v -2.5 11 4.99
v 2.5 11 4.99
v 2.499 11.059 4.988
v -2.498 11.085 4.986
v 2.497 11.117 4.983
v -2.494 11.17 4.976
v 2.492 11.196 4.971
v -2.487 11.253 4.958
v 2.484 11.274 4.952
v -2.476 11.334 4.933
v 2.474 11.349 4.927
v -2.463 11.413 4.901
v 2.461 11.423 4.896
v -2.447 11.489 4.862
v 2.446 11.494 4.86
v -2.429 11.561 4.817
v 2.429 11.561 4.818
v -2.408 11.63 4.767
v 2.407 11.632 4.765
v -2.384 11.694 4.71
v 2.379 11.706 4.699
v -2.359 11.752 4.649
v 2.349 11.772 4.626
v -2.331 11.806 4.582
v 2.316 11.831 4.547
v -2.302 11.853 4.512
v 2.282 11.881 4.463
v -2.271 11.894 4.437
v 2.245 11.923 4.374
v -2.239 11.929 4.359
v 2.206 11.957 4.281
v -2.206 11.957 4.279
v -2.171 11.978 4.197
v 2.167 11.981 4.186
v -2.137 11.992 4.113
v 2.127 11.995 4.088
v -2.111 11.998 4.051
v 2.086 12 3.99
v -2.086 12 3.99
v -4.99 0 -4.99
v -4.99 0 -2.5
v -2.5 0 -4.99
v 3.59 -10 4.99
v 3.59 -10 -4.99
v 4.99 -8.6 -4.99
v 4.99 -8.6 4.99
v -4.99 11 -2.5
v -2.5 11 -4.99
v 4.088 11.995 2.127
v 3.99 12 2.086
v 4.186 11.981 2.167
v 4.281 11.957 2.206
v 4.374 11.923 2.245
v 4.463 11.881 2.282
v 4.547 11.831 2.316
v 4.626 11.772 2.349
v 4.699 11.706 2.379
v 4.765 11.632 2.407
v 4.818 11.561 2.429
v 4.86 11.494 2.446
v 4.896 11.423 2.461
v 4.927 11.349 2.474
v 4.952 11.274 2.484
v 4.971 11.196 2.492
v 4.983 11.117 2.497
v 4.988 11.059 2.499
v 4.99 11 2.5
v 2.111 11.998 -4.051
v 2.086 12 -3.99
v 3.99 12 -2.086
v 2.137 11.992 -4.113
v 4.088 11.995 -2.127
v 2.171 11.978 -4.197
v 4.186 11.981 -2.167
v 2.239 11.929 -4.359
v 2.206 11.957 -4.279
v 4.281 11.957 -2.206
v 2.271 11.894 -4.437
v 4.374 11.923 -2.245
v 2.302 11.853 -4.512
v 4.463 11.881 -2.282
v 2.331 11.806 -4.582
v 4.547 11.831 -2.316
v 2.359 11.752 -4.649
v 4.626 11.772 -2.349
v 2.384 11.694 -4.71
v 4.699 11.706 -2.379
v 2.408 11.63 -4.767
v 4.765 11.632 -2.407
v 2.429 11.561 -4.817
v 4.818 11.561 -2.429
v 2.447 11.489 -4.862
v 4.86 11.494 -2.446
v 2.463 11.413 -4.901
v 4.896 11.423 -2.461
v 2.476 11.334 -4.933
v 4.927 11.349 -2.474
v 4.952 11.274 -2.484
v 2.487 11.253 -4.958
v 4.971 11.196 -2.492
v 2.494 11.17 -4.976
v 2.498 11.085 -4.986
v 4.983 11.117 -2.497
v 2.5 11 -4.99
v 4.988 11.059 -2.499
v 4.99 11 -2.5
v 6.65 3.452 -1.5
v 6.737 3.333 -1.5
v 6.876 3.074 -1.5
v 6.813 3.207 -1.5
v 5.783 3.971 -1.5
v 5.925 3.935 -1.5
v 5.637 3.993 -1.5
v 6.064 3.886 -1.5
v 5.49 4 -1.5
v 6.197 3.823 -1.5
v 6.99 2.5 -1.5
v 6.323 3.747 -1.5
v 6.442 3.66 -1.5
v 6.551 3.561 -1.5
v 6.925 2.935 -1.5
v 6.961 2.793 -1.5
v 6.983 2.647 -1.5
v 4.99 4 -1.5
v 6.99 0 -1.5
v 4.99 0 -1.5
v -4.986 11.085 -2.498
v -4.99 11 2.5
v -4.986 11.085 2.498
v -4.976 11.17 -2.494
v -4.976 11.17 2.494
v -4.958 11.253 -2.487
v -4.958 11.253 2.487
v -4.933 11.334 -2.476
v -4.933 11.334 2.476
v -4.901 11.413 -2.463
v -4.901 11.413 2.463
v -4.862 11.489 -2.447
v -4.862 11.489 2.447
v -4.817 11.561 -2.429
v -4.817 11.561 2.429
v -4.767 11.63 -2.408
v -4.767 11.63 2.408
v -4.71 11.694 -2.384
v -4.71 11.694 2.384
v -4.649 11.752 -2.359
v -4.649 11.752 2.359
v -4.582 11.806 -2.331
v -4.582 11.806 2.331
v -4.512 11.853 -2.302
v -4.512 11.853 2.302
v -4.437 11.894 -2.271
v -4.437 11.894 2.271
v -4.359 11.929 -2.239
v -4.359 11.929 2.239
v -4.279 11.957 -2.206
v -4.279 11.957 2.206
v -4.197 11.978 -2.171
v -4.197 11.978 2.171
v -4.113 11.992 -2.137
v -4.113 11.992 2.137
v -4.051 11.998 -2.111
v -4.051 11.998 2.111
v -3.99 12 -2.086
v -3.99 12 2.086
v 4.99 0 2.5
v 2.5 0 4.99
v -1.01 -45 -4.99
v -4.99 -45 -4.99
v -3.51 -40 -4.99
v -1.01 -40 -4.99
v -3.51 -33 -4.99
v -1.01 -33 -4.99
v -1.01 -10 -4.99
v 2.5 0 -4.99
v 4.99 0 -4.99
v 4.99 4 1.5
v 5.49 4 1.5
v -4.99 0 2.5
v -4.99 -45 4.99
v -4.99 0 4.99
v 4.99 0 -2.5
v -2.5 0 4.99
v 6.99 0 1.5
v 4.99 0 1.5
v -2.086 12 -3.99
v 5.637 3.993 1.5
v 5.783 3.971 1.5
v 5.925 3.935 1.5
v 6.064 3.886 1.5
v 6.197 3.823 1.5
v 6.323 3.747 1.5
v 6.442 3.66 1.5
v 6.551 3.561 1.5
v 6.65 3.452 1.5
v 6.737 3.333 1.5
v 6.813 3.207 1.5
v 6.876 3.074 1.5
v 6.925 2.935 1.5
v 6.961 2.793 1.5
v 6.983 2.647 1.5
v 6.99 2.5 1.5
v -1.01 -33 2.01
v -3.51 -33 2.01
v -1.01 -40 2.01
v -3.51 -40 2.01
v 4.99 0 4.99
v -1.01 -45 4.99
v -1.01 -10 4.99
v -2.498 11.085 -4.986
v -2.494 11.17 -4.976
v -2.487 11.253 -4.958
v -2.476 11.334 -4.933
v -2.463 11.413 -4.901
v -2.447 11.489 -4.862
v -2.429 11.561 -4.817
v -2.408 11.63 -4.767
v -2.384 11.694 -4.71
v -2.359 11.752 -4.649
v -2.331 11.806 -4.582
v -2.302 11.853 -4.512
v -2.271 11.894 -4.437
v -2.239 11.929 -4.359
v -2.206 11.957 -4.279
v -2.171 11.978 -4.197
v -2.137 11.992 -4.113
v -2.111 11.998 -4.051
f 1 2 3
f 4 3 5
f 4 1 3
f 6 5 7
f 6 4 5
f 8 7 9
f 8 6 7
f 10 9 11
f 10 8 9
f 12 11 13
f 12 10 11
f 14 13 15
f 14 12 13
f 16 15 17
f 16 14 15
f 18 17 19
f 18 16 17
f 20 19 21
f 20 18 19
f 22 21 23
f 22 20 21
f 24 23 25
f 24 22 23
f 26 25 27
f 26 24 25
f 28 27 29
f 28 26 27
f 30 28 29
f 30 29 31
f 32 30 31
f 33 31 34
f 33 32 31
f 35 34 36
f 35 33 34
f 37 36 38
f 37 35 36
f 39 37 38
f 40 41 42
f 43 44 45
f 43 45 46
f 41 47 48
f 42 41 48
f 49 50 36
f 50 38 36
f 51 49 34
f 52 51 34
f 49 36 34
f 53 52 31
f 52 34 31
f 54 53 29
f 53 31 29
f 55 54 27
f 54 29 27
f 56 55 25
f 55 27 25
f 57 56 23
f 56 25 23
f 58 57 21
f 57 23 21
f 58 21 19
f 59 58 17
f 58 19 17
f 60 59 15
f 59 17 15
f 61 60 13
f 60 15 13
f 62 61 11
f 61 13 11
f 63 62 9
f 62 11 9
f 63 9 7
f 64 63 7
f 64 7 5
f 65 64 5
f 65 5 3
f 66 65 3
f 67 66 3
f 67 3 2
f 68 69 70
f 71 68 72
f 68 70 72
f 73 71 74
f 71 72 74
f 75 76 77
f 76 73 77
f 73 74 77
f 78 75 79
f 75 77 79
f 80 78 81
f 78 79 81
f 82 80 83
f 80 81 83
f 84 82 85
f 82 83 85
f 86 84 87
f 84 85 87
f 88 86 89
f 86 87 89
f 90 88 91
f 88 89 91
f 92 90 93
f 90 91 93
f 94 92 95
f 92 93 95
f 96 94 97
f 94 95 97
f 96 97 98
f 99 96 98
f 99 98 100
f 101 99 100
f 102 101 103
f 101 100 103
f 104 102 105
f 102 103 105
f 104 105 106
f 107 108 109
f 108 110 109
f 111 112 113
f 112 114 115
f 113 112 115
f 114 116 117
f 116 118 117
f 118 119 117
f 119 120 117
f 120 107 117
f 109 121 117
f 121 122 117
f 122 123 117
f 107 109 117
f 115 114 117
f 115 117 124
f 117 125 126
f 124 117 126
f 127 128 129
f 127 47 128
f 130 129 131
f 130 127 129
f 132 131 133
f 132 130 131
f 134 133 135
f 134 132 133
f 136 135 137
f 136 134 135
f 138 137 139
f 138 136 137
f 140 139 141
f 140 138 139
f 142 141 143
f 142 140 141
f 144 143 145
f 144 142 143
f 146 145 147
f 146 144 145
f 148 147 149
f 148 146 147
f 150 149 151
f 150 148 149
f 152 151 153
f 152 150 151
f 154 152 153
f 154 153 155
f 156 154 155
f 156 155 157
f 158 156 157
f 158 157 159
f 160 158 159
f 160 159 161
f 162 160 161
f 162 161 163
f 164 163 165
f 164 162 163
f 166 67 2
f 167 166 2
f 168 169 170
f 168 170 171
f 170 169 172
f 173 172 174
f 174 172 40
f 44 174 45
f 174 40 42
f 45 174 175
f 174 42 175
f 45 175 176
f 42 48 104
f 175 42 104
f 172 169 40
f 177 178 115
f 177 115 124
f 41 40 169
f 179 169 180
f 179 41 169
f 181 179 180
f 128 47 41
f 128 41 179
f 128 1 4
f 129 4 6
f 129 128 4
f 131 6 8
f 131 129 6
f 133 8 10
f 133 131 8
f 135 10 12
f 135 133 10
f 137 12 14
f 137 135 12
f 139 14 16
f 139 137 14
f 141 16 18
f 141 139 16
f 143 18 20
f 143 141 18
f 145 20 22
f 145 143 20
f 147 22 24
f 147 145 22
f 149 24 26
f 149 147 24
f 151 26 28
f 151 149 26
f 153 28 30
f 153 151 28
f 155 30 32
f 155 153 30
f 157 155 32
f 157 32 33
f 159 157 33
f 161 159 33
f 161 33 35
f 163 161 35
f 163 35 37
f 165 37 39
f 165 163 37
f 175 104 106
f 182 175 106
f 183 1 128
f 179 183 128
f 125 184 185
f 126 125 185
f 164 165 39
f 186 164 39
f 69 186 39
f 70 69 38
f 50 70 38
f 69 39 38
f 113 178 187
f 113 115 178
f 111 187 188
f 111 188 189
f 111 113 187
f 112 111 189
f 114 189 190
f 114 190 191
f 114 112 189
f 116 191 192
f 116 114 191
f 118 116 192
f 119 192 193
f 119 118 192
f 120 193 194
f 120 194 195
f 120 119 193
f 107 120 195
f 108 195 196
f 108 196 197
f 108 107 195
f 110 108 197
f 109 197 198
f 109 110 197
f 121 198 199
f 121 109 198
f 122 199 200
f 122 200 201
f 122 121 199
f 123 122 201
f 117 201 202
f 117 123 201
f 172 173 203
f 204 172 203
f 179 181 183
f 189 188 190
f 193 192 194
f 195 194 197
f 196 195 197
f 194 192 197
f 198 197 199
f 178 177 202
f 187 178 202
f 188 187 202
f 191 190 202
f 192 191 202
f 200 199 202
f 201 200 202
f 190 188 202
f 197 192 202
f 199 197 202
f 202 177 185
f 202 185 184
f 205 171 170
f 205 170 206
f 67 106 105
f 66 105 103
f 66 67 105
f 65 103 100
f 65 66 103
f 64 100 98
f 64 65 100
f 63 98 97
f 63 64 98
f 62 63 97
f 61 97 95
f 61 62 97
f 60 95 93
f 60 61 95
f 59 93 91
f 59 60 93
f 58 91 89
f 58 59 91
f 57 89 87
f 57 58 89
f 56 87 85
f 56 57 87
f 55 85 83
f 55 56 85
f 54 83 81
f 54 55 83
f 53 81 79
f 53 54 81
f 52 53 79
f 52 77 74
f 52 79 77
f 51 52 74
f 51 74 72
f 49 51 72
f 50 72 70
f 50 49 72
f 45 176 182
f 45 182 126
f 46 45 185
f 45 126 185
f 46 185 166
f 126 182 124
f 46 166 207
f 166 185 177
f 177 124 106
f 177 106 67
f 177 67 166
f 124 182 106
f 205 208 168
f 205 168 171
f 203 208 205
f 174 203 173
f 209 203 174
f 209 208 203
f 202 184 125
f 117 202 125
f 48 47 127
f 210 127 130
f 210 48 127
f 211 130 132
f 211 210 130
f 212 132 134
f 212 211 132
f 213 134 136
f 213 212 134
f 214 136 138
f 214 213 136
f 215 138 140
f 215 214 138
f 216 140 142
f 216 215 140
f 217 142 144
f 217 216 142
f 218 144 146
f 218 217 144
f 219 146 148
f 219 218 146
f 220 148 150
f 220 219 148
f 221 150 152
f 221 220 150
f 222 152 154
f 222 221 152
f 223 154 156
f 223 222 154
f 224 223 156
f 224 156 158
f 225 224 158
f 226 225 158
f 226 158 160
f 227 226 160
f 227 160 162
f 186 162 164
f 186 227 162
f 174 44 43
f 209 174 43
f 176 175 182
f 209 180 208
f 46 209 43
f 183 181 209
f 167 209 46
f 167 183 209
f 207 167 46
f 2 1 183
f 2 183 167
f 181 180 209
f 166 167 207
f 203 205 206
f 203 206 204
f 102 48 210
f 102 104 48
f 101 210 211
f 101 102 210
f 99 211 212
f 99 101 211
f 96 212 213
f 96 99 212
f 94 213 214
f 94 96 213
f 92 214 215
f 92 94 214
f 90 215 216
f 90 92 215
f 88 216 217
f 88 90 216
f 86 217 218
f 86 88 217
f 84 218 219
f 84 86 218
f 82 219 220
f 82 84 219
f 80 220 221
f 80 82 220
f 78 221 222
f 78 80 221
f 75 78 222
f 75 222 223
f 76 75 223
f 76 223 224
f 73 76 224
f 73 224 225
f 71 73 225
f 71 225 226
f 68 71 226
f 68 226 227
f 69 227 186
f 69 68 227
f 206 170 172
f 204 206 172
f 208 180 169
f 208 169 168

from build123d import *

# Parameters (mm, degrees)
SKETCH_W        = 9.98
SKETCH_H        = 9.98
PAD_DEPTH       = 45
SKETCH001_W     = 7
SKETCH001_H     = 7
POCKET_DEPTH    = 8.5
PAD001_DEPTH    = 12
FILLET_R        = 1
SKETCH004_W     = 35
SKETCH004_H     = 9.98
POCKET002_DEPTH = 6
CHAMFER_SIZE    = 1.4
PAD002_DEPTH    = 4
FILLET001_R     = 1.5


with BuildPart() as part:
    # Sketch → Pad (new body)
    with BuildSketch(Plane.XZ):
        Rectangle(SKETCH_W, SKETCH_H)
    extrude(amount=PAD_DEPTH)

    # Sketch001 (on Face3 of Pad) → Pocket (cut)
    with BuildSketch(Plane.YZ.offset(4.99)):
        with Locations((-36.5, -1.49)):
            Rectangle(SKETCH001_W, SKETCH001_H)
    extrude(amount=-POCKET_DEPTH, mode=Mode.SUBTRACT)

    # Sketch002 (on Face4 of Pocket) → Pad001 (join)
    with BuildSketch(Plane(origin=(0, 0, 0), x_dir=(-1, 0, 0), z_dir=(0, 1, 0))):
        Polygon((-4.99, 2.5), (-2.5, 4.99), (2.5, 4.99), (4.99, 2.5), (4.99, -2.5), (2.5, -4.99), (-2.5, -4.99), (-4.99, -2.5), align=None)
    extrude(amount=PAD001_DEPTH)

    # Fillet
    fillet_edges = [part.edges().sort_by_distance(p)[0] for p in [
        (3.745, 12, 3.745),
        (0, 12, 4.99),
        (-3.745, 12, 3.745),
        (-4.99, 12, 0),
        (-3.745, 12, -3.745),
        (0, 12, -4.99),
        (3.745, 12, -3.745),
        (4.99, 12, 0),
    ]]
    fillet(fillet_edges, radius=FILLET_R)

    # Sketch004 → Pocket002 (cut)
    with BuildSketch(Plane.YZ.offset(4.99)):
        with Locations((-27.5, 0)):
            Rectangle(SKETCH004_W, SKETCH004_H)
    extrude(amount=-POCKET002_DEPTH, mode=Mode.SUBTRACT)

    # Chamfer
    chamfer_edges = [part.edges().sort_by_distance(p)[0] for p in [
        (4.99, -10, 0),
    ]]
    chamfer(chamfer_edges, length=CHAMFER_SIZE)

    # Sketch005 → Pad002 (join)
    with BuildSketch(Plane.XZ):
        Polygon((4.99, 1.5), (6.99, 1.5), (6.99, -1.5), (4.99, -1.5), (4.99, 0), align=None)
    extrude(amount=-PAD002_DEPTH)

    # Fillet001
    fillet001_edges = [part.edges().sort_by_distance(p)[0] for p in [
        (6.99, 4, 0),
    ]]
    fillet(fillet001_edges, radius=FILLET001_R)


solid = part.part
